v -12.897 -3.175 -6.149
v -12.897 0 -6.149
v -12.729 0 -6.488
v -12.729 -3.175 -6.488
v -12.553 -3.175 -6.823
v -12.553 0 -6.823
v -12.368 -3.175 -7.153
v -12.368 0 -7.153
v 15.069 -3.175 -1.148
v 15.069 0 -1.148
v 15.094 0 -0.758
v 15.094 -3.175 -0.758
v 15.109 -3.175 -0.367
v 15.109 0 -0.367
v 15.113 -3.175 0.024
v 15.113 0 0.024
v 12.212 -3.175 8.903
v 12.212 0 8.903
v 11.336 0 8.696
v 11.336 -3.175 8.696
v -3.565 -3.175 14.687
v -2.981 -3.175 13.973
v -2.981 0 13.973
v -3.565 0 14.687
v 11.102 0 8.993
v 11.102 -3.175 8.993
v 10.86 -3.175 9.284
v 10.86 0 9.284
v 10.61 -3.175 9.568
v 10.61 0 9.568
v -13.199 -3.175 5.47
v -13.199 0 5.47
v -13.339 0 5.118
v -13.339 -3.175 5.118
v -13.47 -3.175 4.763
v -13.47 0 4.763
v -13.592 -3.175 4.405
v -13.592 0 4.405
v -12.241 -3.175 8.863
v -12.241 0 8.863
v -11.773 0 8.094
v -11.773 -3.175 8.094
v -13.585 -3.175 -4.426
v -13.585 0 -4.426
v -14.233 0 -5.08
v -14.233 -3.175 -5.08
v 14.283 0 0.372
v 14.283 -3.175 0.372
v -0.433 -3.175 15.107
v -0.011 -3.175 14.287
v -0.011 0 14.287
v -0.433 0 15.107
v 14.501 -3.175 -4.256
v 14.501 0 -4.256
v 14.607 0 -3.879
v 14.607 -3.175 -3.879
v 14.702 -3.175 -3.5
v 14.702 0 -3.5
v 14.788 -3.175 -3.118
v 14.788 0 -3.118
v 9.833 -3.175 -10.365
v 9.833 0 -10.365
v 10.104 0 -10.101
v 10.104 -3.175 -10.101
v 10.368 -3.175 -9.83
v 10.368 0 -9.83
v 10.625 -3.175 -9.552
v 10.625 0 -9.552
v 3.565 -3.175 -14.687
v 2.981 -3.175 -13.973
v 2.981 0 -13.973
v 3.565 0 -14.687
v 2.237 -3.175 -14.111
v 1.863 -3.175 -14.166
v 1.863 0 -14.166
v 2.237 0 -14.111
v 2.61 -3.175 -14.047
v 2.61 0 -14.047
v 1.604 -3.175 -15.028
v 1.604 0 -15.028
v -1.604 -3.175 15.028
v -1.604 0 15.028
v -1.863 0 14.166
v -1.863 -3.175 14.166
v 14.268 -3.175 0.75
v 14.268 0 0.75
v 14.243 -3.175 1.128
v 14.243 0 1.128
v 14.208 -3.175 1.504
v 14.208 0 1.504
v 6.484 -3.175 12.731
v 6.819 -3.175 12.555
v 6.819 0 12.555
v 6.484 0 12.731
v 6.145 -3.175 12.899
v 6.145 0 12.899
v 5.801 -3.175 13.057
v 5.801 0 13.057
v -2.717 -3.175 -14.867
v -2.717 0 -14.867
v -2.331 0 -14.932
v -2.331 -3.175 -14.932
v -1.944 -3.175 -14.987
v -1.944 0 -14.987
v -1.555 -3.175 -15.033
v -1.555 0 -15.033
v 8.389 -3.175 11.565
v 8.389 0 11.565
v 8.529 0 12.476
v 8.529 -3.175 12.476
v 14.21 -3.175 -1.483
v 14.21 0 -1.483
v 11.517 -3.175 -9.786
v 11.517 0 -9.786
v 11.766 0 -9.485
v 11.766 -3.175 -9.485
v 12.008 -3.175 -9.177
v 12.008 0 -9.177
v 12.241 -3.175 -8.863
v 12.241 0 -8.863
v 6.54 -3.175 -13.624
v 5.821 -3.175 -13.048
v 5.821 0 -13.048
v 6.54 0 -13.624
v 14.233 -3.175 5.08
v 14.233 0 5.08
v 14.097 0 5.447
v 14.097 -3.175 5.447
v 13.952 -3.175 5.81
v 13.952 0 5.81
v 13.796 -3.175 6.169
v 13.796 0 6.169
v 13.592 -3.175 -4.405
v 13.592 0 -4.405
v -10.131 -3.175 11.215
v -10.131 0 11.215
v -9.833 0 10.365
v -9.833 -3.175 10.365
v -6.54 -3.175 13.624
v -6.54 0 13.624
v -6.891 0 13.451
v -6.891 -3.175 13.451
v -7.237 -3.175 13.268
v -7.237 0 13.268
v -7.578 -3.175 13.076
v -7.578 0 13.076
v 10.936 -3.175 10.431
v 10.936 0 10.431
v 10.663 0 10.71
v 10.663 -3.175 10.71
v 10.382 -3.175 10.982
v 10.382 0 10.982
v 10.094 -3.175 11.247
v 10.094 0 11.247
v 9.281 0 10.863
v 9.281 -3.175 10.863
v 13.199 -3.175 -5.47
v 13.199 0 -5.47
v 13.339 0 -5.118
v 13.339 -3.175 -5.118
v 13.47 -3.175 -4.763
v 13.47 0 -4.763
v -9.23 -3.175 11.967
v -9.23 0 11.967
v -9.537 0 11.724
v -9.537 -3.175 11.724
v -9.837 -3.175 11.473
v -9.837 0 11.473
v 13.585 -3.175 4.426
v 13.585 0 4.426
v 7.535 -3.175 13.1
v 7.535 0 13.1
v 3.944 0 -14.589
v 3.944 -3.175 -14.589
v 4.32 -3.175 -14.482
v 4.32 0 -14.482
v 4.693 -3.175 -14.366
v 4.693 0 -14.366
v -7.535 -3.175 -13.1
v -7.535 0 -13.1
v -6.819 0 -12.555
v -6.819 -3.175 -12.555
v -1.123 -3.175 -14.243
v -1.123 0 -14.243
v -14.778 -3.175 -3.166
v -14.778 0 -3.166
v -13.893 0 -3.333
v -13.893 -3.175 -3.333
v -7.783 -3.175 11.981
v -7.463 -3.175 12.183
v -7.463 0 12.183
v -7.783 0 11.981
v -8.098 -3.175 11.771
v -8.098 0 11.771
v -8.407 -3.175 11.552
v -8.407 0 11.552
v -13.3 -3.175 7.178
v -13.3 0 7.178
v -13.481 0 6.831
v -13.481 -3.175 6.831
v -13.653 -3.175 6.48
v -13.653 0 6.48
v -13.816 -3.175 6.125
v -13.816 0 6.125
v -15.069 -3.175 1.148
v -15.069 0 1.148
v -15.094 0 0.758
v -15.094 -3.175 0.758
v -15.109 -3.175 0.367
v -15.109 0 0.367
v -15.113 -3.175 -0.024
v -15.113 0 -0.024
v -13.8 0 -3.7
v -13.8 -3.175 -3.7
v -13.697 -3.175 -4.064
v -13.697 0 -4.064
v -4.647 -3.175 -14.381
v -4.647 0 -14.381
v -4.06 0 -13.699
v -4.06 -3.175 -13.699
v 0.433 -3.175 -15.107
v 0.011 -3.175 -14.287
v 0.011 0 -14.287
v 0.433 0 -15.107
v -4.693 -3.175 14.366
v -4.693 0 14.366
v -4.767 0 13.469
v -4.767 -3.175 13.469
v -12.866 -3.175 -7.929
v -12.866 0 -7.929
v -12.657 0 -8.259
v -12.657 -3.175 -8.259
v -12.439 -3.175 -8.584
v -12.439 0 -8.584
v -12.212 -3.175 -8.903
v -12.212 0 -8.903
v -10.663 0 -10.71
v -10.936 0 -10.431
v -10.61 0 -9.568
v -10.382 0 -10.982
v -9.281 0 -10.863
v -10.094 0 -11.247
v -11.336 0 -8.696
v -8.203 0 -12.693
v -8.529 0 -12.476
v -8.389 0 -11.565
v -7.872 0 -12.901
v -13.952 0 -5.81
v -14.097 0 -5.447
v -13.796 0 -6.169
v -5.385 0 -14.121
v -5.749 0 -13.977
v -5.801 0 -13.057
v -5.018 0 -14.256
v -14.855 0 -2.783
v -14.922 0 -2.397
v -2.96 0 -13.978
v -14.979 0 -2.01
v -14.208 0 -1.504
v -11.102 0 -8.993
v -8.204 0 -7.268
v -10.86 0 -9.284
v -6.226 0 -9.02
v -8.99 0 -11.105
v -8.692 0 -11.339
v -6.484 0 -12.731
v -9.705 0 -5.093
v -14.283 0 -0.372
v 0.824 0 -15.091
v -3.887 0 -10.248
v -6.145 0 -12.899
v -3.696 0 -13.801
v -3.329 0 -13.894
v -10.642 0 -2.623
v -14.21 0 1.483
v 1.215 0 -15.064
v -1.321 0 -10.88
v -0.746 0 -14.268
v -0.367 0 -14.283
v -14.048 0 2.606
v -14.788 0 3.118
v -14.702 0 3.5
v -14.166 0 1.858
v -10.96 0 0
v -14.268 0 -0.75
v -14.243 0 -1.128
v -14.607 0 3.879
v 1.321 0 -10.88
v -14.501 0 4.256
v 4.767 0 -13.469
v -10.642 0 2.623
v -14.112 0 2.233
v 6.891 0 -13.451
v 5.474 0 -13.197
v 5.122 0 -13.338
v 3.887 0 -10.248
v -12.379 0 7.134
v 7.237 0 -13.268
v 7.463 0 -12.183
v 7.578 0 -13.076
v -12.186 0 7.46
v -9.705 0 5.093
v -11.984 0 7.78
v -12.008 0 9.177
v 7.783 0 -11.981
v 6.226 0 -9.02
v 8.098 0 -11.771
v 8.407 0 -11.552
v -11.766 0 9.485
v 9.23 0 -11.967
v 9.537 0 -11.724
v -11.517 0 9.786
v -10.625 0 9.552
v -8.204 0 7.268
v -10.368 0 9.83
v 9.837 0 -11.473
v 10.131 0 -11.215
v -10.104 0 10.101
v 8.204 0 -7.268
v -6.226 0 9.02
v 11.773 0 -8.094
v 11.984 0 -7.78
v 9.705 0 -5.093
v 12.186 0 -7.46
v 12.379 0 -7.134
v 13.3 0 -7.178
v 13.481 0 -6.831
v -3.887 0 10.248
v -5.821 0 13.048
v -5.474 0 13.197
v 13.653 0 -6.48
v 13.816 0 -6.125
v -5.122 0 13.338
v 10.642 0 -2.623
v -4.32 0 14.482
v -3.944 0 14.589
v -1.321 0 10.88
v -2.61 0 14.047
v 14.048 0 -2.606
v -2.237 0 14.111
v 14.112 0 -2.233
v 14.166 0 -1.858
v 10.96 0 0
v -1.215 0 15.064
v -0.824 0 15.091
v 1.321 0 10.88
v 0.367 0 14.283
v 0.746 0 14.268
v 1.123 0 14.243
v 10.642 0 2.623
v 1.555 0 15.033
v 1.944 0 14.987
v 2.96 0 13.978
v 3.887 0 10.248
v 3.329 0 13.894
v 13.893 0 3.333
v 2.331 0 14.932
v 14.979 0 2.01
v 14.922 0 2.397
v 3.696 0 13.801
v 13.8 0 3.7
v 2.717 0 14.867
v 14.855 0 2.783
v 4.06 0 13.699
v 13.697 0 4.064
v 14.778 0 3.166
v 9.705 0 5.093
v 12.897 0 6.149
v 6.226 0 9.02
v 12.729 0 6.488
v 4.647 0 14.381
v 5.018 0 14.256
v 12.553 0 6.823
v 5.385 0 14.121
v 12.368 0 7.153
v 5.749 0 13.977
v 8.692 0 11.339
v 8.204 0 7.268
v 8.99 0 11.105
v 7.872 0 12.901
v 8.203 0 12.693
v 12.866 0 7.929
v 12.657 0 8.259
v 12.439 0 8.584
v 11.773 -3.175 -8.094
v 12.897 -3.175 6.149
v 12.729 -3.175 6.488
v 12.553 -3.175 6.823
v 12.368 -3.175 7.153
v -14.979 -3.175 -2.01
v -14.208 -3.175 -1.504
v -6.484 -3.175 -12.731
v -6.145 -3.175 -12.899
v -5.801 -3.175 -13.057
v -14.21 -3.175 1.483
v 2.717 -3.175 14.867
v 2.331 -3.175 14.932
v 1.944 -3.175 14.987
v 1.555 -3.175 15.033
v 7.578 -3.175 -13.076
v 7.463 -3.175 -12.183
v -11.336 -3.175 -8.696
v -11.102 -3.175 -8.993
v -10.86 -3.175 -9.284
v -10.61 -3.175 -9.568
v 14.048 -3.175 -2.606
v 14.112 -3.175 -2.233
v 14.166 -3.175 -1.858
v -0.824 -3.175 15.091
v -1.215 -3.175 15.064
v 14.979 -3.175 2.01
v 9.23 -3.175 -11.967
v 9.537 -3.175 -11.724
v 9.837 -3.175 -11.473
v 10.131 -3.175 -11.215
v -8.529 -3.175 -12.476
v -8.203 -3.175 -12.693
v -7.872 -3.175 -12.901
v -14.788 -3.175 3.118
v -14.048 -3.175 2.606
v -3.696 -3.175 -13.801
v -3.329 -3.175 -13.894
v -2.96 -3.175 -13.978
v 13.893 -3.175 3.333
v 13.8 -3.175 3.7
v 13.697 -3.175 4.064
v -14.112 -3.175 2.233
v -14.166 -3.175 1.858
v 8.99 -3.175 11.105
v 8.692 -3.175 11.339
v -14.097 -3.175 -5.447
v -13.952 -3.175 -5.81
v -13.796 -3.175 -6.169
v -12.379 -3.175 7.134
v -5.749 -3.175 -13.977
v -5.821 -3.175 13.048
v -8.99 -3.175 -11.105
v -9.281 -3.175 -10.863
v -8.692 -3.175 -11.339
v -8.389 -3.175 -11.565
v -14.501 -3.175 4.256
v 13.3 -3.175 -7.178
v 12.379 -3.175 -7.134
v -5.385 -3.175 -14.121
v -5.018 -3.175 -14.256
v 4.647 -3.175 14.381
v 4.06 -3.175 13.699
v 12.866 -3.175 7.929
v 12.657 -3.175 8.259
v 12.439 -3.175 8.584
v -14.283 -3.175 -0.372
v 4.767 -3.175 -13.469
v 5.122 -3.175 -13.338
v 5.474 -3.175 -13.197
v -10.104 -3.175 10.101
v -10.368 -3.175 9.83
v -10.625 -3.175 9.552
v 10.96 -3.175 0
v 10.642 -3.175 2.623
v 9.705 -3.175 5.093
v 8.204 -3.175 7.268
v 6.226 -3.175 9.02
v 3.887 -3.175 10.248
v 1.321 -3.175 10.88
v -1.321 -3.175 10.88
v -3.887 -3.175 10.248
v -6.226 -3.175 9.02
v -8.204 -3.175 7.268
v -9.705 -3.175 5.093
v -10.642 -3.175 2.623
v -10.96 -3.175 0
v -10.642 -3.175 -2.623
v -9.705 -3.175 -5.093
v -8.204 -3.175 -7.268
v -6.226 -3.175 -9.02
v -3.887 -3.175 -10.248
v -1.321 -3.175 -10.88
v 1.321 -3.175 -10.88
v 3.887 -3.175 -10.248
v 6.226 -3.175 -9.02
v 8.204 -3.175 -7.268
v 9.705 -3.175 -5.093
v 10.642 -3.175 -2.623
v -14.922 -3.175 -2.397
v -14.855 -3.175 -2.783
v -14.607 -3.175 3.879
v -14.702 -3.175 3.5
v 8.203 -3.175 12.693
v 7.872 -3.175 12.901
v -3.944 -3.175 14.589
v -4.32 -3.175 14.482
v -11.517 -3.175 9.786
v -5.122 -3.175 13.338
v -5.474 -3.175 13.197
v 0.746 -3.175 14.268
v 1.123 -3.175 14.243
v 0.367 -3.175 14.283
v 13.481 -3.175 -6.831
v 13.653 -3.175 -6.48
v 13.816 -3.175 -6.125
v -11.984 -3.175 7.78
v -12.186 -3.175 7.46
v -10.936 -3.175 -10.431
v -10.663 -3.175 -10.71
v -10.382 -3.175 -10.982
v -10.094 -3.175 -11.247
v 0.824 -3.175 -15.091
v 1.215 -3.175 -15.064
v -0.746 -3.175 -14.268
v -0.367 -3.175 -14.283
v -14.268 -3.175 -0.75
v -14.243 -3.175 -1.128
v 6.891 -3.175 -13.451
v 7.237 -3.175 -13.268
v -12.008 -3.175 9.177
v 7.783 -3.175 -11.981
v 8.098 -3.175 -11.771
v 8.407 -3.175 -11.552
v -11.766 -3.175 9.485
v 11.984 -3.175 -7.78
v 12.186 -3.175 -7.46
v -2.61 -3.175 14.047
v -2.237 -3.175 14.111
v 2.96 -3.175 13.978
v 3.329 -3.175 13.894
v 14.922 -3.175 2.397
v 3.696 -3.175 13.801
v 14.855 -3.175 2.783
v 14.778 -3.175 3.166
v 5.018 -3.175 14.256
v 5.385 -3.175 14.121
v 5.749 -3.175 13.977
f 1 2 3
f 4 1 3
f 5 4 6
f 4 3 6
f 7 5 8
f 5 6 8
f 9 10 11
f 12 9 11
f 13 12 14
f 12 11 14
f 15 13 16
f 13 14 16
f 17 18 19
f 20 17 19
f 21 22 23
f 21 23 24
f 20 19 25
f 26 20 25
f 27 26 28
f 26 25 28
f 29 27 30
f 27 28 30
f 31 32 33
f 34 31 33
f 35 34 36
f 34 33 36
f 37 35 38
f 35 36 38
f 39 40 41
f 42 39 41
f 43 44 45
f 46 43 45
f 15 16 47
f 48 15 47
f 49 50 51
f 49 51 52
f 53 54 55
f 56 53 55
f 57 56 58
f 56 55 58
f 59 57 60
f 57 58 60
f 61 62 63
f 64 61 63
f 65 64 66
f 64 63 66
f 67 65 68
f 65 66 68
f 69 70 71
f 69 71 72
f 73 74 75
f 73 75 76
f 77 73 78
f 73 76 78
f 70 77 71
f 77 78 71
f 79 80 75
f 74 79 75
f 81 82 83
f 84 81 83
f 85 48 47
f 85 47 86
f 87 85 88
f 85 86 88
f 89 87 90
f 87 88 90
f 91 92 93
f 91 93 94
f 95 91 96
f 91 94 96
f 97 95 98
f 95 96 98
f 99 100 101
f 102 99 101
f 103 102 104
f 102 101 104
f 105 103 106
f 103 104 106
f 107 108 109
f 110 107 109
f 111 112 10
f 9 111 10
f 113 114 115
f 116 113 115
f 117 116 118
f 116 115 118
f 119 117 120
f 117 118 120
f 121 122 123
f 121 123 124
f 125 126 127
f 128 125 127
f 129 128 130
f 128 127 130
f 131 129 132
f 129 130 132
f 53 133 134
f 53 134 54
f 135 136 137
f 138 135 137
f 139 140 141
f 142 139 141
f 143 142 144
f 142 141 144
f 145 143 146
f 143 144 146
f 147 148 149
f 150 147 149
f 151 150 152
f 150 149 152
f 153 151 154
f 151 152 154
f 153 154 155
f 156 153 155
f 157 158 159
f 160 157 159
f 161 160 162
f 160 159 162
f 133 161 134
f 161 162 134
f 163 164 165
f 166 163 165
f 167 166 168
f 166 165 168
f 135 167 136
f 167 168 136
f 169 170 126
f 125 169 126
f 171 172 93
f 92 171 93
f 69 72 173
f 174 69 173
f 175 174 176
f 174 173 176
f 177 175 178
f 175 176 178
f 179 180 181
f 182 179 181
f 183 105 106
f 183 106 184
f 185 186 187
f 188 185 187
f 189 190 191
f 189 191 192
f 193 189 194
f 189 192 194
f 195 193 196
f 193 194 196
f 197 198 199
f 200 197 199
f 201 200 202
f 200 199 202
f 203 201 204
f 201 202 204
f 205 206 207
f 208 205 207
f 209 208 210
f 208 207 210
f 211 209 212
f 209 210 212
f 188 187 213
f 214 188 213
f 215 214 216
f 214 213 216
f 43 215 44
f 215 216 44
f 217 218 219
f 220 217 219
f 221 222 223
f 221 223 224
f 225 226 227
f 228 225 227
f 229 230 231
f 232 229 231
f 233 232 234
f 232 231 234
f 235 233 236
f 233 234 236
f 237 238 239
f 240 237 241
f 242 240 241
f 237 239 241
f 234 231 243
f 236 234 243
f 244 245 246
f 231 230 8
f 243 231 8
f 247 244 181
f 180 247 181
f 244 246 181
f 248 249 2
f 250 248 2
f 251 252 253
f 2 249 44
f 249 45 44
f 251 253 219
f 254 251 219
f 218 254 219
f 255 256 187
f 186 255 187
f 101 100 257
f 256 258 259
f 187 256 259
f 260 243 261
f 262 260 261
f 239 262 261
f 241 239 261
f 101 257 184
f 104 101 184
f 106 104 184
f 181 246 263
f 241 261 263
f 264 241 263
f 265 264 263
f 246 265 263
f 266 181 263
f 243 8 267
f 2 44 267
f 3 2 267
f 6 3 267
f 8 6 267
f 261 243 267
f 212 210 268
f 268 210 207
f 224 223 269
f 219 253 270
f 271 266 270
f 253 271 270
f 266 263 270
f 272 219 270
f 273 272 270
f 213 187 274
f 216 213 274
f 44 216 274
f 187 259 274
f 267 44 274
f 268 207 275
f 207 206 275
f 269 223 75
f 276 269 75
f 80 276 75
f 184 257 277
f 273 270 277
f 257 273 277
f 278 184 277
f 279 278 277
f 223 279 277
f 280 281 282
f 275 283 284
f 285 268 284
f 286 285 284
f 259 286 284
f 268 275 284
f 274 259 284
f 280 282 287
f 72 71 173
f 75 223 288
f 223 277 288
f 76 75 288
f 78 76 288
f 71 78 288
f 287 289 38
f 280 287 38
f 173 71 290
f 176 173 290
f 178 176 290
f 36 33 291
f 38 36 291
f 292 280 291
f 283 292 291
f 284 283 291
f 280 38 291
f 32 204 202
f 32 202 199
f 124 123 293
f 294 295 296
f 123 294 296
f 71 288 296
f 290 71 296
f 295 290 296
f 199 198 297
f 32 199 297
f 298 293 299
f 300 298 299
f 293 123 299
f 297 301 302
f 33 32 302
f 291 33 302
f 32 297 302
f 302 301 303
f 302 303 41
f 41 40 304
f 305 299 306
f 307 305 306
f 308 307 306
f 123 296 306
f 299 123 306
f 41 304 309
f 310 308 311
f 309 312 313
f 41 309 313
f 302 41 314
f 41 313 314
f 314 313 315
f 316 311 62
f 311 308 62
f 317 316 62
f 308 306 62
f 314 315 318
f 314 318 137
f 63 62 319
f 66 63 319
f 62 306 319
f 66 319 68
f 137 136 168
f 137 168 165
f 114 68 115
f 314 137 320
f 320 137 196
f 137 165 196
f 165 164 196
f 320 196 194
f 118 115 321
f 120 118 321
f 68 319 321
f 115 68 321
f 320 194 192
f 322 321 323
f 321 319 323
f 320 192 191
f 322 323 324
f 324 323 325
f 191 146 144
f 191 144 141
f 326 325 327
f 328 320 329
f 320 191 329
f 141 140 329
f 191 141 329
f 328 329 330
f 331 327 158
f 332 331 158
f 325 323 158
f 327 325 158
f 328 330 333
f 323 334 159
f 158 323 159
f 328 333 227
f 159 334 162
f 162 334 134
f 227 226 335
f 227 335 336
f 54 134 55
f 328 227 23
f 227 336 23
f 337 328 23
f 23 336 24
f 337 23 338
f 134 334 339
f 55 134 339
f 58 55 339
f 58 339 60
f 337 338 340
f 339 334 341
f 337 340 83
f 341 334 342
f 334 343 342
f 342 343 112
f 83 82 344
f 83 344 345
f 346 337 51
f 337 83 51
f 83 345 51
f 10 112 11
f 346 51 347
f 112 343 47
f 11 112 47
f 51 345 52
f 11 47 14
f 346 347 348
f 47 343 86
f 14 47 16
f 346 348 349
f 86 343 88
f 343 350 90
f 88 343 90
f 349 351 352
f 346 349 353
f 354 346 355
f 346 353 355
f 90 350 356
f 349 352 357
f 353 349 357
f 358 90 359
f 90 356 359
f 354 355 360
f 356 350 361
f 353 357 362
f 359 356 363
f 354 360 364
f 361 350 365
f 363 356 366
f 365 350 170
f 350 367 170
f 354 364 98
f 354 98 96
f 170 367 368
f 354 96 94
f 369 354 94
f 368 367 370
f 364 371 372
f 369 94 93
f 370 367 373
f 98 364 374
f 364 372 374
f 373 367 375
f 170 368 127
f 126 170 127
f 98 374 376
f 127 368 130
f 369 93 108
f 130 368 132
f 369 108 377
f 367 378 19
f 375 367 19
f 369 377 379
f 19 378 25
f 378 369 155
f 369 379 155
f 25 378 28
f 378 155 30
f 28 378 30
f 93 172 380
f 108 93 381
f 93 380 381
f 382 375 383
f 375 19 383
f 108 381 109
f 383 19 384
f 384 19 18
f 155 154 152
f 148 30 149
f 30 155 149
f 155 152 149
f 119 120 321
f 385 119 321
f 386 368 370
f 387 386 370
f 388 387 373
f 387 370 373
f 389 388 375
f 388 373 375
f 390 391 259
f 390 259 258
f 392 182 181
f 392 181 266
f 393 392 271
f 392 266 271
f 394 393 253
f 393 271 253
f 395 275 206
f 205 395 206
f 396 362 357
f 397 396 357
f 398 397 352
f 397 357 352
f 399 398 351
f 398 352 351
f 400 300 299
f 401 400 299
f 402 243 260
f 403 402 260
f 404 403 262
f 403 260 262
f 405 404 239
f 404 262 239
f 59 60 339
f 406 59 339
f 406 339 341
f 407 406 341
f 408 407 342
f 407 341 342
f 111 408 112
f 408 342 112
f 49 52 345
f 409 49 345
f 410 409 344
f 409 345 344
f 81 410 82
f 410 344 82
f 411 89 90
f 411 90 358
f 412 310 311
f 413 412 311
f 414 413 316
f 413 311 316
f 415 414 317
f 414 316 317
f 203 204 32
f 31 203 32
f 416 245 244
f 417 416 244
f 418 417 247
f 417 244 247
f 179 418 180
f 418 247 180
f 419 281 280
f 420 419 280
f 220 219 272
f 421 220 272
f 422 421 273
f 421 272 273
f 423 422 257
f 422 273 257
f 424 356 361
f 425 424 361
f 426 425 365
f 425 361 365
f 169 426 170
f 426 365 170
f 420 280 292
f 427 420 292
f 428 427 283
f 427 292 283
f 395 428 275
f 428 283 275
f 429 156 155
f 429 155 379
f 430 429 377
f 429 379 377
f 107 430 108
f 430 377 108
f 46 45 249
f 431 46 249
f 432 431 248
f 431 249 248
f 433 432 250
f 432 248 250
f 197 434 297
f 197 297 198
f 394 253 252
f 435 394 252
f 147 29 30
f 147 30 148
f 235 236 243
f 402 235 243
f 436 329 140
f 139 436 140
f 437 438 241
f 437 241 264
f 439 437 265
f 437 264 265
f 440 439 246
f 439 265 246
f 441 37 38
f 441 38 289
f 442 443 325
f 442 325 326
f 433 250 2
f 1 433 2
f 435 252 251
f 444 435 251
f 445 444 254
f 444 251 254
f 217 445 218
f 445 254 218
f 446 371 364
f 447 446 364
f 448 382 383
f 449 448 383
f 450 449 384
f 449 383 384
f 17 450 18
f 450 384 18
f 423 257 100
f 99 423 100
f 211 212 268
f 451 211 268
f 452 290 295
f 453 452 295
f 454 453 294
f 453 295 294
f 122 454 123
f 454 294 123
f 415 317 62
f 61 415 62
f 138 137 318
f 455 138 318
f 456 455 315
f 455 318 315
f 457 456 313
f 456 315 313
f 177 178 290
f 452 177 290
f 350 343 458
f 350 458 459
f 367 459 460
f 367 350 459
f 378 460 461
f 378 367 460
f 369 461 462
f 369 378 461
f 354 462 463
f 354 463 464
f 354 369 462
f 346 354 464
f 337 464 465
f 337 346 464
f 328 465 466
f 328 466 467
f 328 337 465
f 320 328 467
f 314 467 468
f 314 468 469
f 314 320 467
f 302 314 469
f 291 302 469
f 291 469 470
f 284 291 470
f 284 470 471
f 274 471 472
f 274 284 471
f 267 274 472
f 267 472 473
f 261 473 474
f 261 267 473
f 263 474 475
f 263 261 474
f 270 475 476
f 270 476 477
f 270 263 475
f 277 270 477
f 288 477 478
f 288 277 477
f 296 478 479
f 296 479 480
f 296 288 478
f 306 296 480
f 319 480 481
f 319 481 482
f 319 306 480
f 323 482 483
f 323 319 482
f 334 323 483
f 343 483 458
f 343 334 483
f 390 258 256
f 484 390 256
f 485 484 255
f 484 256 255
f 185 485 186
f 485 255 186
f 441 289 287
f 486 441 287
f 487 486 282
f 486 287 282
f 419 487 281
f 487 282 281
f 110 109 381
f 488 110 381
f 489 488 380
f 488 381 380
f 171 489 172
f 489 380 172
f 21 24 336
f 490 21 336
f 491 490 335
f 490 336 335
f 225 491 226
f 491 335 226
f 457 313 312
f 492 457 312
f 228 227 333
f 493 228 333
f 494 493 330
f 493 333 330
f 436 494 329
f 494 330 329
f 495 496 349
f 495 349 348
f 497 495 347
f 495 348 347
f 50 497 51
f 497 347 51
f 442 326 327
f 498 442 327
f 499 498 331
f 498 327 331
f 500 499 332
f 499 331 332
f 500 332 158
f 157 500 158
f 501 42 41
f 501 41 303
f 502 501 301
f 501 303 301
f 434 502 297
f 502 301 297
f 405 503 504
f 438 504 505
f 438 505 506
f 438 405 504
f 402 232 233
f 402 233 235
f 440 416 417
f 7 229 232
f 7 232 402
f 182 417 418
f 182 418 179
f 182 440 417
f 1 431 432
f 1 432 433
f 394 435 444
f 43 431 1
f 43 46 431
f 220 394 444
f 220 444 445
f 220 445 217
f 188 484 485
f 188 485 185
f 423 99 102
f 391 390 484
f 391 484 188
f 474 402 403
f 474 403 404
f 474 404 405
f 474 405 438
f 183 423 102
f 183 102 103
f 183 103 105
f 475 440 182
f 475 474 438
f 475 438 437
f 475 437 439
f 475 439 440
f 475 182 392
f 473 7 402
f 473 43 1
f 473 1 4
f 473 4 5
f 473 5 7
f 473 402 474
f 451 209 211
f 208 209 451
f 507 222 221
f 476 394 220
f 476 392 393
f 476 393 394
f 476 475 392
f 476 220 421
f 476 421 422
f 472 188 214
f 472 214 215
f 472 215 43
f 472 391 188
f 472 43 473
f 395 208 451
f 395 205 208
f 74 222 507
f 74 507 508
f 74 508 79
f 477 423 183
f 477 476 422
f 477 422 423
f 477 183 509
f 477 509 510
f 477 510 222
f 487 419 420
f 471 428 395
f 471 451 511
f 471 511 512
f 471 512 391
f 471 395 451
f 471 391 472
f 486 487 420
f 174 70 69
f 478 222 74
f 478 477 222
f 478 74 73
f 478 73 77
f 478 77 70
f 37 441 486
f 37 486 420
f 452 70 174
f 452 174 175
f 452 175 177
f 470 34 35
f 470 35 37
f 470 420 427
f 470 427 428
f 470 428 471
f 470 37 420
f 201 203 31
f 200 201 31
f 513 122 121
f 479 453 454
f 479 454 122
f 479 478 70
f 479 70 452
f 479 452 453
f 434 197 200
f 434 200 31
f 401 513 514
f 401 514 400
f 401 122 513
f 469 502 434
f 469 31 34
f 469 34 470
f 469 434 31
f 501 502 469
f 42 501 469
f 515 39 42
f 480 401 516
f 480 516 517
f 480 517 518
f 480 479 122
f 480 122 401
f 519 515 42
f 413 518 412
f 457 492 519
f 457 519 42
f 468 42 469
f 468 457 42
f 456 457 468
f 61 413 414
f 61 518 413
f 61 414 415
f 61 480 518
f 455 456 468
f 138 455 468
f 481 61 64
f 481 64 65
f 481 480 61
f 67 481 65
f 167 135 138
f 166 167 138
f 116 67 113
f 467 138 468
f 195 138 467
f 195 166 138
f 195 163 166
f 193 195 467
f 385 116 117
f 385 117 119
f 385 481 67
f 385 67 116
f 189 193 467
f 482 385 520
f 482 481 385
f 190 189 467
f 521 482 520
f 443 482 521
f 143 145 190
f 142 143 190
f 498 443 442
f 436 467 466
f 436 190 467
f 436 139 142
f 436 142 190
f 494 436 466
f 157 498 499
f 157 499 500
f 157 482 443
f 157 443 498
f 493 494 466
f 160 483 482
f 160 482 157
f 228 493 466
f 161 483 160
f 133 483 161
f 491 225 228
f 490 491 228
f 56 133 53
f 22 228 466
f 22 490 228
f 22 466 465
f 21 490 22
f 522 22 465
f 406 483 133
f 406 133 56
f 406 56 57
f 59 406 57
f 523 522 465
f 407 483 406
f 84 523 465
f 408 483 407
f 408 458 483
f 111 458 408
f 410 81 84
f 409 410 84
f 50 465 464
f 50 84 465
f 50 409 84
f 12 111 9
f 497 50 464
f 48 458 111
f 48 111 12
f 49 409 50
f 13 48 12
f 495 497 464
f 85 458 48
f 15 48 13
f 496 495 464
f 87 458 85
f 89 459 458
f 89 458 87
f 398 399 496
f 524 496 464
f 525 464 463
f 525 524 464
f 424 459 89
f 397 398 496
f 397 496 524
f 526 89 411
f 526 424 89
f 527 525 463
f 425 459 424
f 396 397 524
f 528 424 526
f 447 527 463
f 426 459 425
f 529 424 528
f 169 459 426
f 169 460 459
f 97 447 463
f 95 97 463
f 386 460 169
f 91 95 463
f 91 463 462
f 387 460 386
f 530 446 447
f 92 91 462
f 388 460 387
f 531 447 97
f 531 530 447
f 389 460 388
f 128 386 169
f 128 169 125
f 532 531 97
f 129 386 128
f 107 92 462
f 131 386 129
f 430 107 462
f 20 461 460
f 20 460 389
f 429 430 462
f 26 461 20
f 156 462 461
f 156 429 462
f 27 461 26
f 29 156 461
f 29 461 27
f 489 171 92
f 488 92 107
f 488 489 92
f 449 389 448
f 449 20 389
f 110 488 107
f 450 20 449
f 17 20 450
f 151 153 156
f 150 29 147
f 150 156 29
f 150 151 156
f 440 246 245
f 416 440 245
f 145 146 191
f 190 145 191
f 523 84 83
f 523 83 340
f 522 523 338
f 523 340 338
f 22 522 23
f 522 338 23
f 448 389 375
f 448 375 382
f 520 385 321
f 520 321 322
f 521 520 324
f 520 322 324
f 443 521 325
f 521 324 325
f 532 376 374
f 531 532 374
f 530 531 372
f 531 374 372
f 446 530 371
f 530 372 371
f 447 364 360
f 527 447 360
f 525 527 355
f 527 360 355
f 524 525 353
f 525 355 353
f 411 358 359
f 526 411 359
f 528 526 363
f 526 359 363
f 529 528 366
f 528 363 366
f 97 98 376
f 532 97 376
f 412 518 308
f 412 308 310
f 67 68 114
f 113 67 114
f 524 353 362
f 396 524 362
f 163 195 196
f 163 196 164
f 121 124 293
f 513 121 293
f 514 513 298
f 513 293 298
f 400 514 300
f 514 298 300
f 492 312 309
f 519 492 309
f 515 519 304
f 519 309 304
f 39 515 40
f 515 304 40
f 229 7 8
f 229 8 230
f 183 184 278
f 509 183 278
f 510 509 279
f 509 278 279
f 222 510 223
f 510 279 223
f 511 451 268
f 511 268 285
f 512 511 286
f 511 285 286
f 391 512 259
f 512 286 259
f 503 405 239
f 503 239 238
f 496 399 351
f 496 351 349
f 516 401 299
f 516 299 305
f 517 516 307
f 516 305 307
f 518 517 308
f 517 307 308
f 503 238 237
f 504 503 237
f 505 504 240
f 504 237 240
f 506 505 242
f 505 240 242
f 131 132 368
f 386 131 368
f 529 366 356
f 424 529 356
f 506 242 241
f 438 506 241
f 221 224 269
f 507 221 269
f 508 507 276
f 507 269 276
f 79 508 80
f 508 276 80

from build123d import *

# Parameters (mm, degrees)
F0_R     = 14.2875
F0_R_2   = 10.9601
F1_DEPTH = 3.175
F3_DEPTH = 3.175


with BuildPart() as f1:
    # F0 (on Front) → F1 (new body)
    with BuildSketch(Plane.XZ):
        Circle(F0_R)
        Circle(F0_R_2, mode=Mode.SUBTRACT)
    extrude(amount=F1_DEPTH)

    # F2 (on Front) → F3 (join, through all)
    with BuildSketch(Plane.XZ):
        with BuildLine():
            Line((0, 14.266242), (-0.433452, 15.106783))
            ThreePointArc((-0.433452, 15.106783), (-1.019514, 15.078573), (-1.604039, 15.027635))
            Line((-1.604039, 15.027635), (-1.897302, 14.050528))
            Line((-1.897302, 14.050528), (0, 14.266242))
        make_face()
        with BuildLine():
            ThreePointArc((-3.564857, 14.686544), (-4.132247, 14.537101), (-4.693408, 14.365747))
            Line((-4.693408, 14.365747), (-4.777111, 13.349018))
            Line((-4.777111, 13.349018), (-2.966118, 13.95449))
            Line((-2.966118, 13.95449), (-3.564857, 14.686544))
        make_face()
        with BuildLine():
            ThreePointArc((-6.54046, 13.624432), (-7.06438, 13.360288), (-7.577653, 13.076007))
            Line((-7.577653, 13.076007), (-7.448136, 12.064093))
            Line((-7.448136, 12.064093), (-5.802603, 13.03286))
            Line((-5.802603, 13.03286), (-6.54046, 13.624432))
        make_face()
        with BuildLine():
            ThreePointArc((-9.230214, 11.966867), (-9.687767, 11.599566), (-10.130717, 11.214782))
            Line((-10.130717, 11.214782), (-9.793643, 10.251909))
            Line((-9.793643, 10.251909), (-8.385486, 11.541632))
            Line((-8.385486, 11.541632), (-9.230214, 11.966867))
        make_face()
        with BuildLine():
            ThreePointArc((-11.516564, 9.786293), (-11.887751, 9.331888), (-12.241021, 8.863418))
            Line((-12.241021, 8.863418), (-11.71112, 7.991668))
            Line((-11.71112, 7.991668), (-10.601884, 9.545979))
            Line((-10.601884, 9.545979), (-11.516564, 9.786293))
        make_face()
        with BuildLine():
            ThreePointArc((-13.299584, 7.178011), (-13.568184, 6.656362), (-13.816334, 6.124679))
            Line((-13.816334, 6.124679), (-13.116765, 5.382152))
            Line((-13.116765, 5.382152), (-12.354928, 7.133121))
            Line((-12.354928, 7.133121), (-13.299584, 7.178011))
        make_face()
        with BuildLine():
            ThreePointArc((-14.501348, 4.256015), (-14.655622, 3.68992), (-14.787806, 3.118263))
            Line((-14.787806, 3.118263), (-13.949144, 2.53741))
            Line((-13.949144, 2.53741), (-13.568002, 4.408511))
            Line((-13.568002, 4.408511), (-14.501348, 4.256015))
        make_face()
        with BuildLine():
            ThreePointArc((-15.069334, 1.148011), (-15.102539, 0.562211), (-15.11298, -0.024436))
            Line((-15.11298, -0.024436), (-14.171879, -0.418229))
            Line((-14.171879, -0.418229), (-14.18809, 1.491228))
            Line((-14.18809, 1.491228), (-15.069334, 1.148011))
        make_face()
        with BuildLine():
            ThreePointArc((-14.978718, -2.010166), (-14.889403, -2.590069), (-14.777645, -3.166068))
            Line((-14.777645, -3.166068), (-13.775235, -3.355589))
            Line((-13.775235, -3.355589), (-14.18809, -1.491228))
            Line((-14.18809, -1.491228), (-14.978718, -2.010166))
        make_face()
        with BuildLine():
            ThreePointArc((-14.23346, -5.08049), (-14.025528, -5.629151), (-13.796455, -6.169326))
            Line((-13.796455, -6.169326), (-12.776547, -6.146293))
            Line((-12.776547, -6.146293), (-13.568002, -4.408511))
            Line((-13.568002, -4.408511), (-14.23346, -5.08049))
        make_face()
        with BuildLine():
            ThreePointArc((-12.866132, -7.928772), (-12.54867, -8.422211), (-12.212295, -8.902956))
            Line((-12.212295, -8.902956), (-11.219463, -8.668376))
            Line((-11.219463, -8.668376), (-12.354928, -7.133121))
            Line((-12.354928, -7.133121), (-12.866132, -7.928772))
        make_face()
        with BuildLine():
            ThreePointArc((-10.936491, -10.430528), (-10.523375, -10.847181), (-10.094398, -11.247484))
            Line((-10.094398, -11.247484), (-9.172034, -10.811608))
            Line((-9.172034, -10.811608), (-10.601884, -9.545979))
            Line((-10.601884, -9.545979), (-10.936491, -10.430528))
        make_face()
        with BuildLine():
            ThreePointArc((-8.528874, -12.476421), (-8.038159, -12.798077), (-7.535328, -13.100443))
            Line((-7.535328, -13.100443), (-6.723743, -12.482322))
            Line((-6.723743, -12.482322), (-8.385486, -11.541632))
            Line((-8.385486, -11.541632), (-8.528874, -12.476421))
        make_face()
        with BuildLine():
            ThreePointArc((-5.748504, -13.977034), (-5.201636, -14.189635), (-4.646927, -14.38085))
            Line((-4.646927, -14.38085), (-3.981593, -13.607498))
            Line((-3.981593, -13.607498), (-5.802603, -13.03286))
            Line((-5.802603, -13.03286), (-5.748504, -13.977034))
        make_face()
        with BuildLine():
            ThreePointArc((-2.716897, -14.866783), (-2.137777, -14.961039), (-1.555434, -15.032744))
            Line((-1.555434, -15.032744), (-1.065427, -14.137961))
            Line((-1.065427, -14.137961), (-2.966118, -13.95449))
            Line((-2.966118, -13.95449), (-2.716897, -14.866783))
        make_face()
        with BuildLine():
            ThreePointArc((0.433452, -15.106783), (1.019514, -15.078573), (1.604039, -15.027635))
            Line((1.604039, -15.027635), (1.897302, -14.050528))
            Line((1.897302, -14.050528), (0, -14.266242))
            Line((0, -14.266242), (0.433452, -15.106783))
        make_face()
        with BuildLine():
            ThreePointArc((3.564857, -14.686544), (4.132247, -14.537101), (4.693408, -14.365747))
            Line((4.693408, -14.365747), (4.777111, -13.349018))
            Line((4.777111, -13.349018), (2.966118, -13.95449))
            Line((2.966118, -13.95449), (3.564857, -14.686544))
        make_face()
        with BuildLine():
            ThreePointArc((6.54046, -13.624432), (7.06438, -13.360288), (7.577653, -13.076007))
            Line((7.577653, -13.076007), (7.448136, -12.064093))
            Line((7.448136, -12.064093), (5.802603, -13.03286))
            Line((5.802603, -13.03286), (6.54046, -13.624432))
        make_face()
        with BuildLine():
            ThreePointArc((9.230214, -11.966867), (9.687767, -11.599566), (10.130717, -11.214782))
            Line((10.130717, -11.214782), (9.793643, -10.251909))
            Line((9.793643, -10.251909), (8.385486, -11.541632))
            Line((8.385486, -11.541632), (9.230214, -11.966867))
        make_face()
        with BuildLine():
            ThreePointArc((11.516564, -9.786293), (11.887751, -9.331888), (12.241021, -8.863418))
            Line((12.241021, -8.863418), (11.71112, -7.991668))
            Line((11.71112, -7.991668), (10.601884, -9.545979))
            Line((10.601884, -9.545979), (11.516564, -9.786293))
        make_face()
        with BuildLine():
            ThreePointArc((13.299584, -7.178011), (13.568184, -6.656362), (13.816334, -6.124679))
            Line((13.816334, -6.124679), (13.116765, -5.382152))
            Line((13.116765, -5.382152), (12.354928, -7.133121))
            Line((12.354928, -7.133121), (13.299584, -7.178011))
        make_face()
        with BuildLine():
            ThreePointArc((14.501348, -4.256015), (14.655622, -3.68992), (14.787806, -3.118263))
            Line((14.787806, -3.118263), (13.949144, -2.53741))
            Line((13.949144, -2.53741), (13.568002, -4.408511))
            Line((13.568002, -4.408511), (14.501348, -4.256015))
        make_face()
        with BuildLine():
            ThreePointArc((15.069334, -1.148011), (15.102539, -0.562211), (15.11298, 0.024436))
            Line((15.11298, 0.024436), (14.171879, 0.418229))
            Line((14.171879, 0.418229), (14.18809, -1.491228))
            Line((14.18809, -1.491228), (15.069334, -1.148011))
        make_face()
        with BuildLine():
            ThreePointArc((14.978718, 2.010166), (14.889403, 2.590069), (14.777645, 3.166068))
            Line((14.777645, 3.166068), (13.775235, 3.355589))
            Line((13.775235, 3.355589), (14.18809, 1.491228))
            Line((14.18809, 1.491228), (14.978718, 2.010166))
        make_face()
        with BuildLine():
            ThreePointArc((14.23346, 5.08049), (14.025528, 5.629151), (13.796455, 6.169326))
            Line((13.796455, 6.169326), (12.776547, 6.146293))
            Line((12.776547, 6.146293), (13.568002, 4.408511))
            Line((13.568002, 4.408511), (14.23346, 5.08049))
        make_face()
        with BuildLine():
            ThreePointArc((12.866132, 7.928772), (12.54867, 8.422211), (12.212295, 8.902956))
            Line((12.212295, 8.902956), (11.219463, 8.668376))
            Line((11.219463, 8.668376), (12.354928, 7.133121))
            Line((12.354928, 7.133121), (12.866132, 7.928772))
        make_face()
        with BuildLine():
            ThreePointArc((10.936491, 10.430528), (10.523375, 10.847181), (10.094398, 11.247484))
            Line((10.094398, 11.247484), (9.172034, 10.811608))
            Line((9.172034, 10.811608), (10.601884, 9.545979))
            Line((10.601884, 9.545979), (10.936491, 10.430528))
        make_face()
        with BuildLine():
            ThreePointArc((8.528874, 12.476421), (8.038159, 12.798077), (7.535328, 13.100443))
            Line((7.535328, 13.100443), (6.723743, 12.482322))
            Line((6.723743, 12.482322), (8.385486, 11.541632))
            Line((8.385486, 11.541632), (8.528874, 12.476421))
        make_face()
        with BuildLine():
            ThreePointArc((5.748504, 13.977034), (5.201636, 14.189635), (4.646927, 14.38085))
            Line((4.646927, 14.38085), (3.981593, 13.607498))
            Line((3.981593, 13.607498), (5.802603, 13.03286))
            Line((5.802603, 13.03286), (5.748504, 13.977034))
        make_face()
        with BuildLine():
            ThreePointArc((2.716897, 14.866783), (2.137777, 14.961039), (1.555434, 15.032744))
            Line((1.555434, 15.032744), (1.065427, 14.137961))
            Line((1.065427, 14.137961), (2.966118, 13.95449))
            Line((2.966118, 13.95449), (2.716897, 14.866783))
        make_face()
    extrude(amount=F3_DEPTH)


solid = f1.part
